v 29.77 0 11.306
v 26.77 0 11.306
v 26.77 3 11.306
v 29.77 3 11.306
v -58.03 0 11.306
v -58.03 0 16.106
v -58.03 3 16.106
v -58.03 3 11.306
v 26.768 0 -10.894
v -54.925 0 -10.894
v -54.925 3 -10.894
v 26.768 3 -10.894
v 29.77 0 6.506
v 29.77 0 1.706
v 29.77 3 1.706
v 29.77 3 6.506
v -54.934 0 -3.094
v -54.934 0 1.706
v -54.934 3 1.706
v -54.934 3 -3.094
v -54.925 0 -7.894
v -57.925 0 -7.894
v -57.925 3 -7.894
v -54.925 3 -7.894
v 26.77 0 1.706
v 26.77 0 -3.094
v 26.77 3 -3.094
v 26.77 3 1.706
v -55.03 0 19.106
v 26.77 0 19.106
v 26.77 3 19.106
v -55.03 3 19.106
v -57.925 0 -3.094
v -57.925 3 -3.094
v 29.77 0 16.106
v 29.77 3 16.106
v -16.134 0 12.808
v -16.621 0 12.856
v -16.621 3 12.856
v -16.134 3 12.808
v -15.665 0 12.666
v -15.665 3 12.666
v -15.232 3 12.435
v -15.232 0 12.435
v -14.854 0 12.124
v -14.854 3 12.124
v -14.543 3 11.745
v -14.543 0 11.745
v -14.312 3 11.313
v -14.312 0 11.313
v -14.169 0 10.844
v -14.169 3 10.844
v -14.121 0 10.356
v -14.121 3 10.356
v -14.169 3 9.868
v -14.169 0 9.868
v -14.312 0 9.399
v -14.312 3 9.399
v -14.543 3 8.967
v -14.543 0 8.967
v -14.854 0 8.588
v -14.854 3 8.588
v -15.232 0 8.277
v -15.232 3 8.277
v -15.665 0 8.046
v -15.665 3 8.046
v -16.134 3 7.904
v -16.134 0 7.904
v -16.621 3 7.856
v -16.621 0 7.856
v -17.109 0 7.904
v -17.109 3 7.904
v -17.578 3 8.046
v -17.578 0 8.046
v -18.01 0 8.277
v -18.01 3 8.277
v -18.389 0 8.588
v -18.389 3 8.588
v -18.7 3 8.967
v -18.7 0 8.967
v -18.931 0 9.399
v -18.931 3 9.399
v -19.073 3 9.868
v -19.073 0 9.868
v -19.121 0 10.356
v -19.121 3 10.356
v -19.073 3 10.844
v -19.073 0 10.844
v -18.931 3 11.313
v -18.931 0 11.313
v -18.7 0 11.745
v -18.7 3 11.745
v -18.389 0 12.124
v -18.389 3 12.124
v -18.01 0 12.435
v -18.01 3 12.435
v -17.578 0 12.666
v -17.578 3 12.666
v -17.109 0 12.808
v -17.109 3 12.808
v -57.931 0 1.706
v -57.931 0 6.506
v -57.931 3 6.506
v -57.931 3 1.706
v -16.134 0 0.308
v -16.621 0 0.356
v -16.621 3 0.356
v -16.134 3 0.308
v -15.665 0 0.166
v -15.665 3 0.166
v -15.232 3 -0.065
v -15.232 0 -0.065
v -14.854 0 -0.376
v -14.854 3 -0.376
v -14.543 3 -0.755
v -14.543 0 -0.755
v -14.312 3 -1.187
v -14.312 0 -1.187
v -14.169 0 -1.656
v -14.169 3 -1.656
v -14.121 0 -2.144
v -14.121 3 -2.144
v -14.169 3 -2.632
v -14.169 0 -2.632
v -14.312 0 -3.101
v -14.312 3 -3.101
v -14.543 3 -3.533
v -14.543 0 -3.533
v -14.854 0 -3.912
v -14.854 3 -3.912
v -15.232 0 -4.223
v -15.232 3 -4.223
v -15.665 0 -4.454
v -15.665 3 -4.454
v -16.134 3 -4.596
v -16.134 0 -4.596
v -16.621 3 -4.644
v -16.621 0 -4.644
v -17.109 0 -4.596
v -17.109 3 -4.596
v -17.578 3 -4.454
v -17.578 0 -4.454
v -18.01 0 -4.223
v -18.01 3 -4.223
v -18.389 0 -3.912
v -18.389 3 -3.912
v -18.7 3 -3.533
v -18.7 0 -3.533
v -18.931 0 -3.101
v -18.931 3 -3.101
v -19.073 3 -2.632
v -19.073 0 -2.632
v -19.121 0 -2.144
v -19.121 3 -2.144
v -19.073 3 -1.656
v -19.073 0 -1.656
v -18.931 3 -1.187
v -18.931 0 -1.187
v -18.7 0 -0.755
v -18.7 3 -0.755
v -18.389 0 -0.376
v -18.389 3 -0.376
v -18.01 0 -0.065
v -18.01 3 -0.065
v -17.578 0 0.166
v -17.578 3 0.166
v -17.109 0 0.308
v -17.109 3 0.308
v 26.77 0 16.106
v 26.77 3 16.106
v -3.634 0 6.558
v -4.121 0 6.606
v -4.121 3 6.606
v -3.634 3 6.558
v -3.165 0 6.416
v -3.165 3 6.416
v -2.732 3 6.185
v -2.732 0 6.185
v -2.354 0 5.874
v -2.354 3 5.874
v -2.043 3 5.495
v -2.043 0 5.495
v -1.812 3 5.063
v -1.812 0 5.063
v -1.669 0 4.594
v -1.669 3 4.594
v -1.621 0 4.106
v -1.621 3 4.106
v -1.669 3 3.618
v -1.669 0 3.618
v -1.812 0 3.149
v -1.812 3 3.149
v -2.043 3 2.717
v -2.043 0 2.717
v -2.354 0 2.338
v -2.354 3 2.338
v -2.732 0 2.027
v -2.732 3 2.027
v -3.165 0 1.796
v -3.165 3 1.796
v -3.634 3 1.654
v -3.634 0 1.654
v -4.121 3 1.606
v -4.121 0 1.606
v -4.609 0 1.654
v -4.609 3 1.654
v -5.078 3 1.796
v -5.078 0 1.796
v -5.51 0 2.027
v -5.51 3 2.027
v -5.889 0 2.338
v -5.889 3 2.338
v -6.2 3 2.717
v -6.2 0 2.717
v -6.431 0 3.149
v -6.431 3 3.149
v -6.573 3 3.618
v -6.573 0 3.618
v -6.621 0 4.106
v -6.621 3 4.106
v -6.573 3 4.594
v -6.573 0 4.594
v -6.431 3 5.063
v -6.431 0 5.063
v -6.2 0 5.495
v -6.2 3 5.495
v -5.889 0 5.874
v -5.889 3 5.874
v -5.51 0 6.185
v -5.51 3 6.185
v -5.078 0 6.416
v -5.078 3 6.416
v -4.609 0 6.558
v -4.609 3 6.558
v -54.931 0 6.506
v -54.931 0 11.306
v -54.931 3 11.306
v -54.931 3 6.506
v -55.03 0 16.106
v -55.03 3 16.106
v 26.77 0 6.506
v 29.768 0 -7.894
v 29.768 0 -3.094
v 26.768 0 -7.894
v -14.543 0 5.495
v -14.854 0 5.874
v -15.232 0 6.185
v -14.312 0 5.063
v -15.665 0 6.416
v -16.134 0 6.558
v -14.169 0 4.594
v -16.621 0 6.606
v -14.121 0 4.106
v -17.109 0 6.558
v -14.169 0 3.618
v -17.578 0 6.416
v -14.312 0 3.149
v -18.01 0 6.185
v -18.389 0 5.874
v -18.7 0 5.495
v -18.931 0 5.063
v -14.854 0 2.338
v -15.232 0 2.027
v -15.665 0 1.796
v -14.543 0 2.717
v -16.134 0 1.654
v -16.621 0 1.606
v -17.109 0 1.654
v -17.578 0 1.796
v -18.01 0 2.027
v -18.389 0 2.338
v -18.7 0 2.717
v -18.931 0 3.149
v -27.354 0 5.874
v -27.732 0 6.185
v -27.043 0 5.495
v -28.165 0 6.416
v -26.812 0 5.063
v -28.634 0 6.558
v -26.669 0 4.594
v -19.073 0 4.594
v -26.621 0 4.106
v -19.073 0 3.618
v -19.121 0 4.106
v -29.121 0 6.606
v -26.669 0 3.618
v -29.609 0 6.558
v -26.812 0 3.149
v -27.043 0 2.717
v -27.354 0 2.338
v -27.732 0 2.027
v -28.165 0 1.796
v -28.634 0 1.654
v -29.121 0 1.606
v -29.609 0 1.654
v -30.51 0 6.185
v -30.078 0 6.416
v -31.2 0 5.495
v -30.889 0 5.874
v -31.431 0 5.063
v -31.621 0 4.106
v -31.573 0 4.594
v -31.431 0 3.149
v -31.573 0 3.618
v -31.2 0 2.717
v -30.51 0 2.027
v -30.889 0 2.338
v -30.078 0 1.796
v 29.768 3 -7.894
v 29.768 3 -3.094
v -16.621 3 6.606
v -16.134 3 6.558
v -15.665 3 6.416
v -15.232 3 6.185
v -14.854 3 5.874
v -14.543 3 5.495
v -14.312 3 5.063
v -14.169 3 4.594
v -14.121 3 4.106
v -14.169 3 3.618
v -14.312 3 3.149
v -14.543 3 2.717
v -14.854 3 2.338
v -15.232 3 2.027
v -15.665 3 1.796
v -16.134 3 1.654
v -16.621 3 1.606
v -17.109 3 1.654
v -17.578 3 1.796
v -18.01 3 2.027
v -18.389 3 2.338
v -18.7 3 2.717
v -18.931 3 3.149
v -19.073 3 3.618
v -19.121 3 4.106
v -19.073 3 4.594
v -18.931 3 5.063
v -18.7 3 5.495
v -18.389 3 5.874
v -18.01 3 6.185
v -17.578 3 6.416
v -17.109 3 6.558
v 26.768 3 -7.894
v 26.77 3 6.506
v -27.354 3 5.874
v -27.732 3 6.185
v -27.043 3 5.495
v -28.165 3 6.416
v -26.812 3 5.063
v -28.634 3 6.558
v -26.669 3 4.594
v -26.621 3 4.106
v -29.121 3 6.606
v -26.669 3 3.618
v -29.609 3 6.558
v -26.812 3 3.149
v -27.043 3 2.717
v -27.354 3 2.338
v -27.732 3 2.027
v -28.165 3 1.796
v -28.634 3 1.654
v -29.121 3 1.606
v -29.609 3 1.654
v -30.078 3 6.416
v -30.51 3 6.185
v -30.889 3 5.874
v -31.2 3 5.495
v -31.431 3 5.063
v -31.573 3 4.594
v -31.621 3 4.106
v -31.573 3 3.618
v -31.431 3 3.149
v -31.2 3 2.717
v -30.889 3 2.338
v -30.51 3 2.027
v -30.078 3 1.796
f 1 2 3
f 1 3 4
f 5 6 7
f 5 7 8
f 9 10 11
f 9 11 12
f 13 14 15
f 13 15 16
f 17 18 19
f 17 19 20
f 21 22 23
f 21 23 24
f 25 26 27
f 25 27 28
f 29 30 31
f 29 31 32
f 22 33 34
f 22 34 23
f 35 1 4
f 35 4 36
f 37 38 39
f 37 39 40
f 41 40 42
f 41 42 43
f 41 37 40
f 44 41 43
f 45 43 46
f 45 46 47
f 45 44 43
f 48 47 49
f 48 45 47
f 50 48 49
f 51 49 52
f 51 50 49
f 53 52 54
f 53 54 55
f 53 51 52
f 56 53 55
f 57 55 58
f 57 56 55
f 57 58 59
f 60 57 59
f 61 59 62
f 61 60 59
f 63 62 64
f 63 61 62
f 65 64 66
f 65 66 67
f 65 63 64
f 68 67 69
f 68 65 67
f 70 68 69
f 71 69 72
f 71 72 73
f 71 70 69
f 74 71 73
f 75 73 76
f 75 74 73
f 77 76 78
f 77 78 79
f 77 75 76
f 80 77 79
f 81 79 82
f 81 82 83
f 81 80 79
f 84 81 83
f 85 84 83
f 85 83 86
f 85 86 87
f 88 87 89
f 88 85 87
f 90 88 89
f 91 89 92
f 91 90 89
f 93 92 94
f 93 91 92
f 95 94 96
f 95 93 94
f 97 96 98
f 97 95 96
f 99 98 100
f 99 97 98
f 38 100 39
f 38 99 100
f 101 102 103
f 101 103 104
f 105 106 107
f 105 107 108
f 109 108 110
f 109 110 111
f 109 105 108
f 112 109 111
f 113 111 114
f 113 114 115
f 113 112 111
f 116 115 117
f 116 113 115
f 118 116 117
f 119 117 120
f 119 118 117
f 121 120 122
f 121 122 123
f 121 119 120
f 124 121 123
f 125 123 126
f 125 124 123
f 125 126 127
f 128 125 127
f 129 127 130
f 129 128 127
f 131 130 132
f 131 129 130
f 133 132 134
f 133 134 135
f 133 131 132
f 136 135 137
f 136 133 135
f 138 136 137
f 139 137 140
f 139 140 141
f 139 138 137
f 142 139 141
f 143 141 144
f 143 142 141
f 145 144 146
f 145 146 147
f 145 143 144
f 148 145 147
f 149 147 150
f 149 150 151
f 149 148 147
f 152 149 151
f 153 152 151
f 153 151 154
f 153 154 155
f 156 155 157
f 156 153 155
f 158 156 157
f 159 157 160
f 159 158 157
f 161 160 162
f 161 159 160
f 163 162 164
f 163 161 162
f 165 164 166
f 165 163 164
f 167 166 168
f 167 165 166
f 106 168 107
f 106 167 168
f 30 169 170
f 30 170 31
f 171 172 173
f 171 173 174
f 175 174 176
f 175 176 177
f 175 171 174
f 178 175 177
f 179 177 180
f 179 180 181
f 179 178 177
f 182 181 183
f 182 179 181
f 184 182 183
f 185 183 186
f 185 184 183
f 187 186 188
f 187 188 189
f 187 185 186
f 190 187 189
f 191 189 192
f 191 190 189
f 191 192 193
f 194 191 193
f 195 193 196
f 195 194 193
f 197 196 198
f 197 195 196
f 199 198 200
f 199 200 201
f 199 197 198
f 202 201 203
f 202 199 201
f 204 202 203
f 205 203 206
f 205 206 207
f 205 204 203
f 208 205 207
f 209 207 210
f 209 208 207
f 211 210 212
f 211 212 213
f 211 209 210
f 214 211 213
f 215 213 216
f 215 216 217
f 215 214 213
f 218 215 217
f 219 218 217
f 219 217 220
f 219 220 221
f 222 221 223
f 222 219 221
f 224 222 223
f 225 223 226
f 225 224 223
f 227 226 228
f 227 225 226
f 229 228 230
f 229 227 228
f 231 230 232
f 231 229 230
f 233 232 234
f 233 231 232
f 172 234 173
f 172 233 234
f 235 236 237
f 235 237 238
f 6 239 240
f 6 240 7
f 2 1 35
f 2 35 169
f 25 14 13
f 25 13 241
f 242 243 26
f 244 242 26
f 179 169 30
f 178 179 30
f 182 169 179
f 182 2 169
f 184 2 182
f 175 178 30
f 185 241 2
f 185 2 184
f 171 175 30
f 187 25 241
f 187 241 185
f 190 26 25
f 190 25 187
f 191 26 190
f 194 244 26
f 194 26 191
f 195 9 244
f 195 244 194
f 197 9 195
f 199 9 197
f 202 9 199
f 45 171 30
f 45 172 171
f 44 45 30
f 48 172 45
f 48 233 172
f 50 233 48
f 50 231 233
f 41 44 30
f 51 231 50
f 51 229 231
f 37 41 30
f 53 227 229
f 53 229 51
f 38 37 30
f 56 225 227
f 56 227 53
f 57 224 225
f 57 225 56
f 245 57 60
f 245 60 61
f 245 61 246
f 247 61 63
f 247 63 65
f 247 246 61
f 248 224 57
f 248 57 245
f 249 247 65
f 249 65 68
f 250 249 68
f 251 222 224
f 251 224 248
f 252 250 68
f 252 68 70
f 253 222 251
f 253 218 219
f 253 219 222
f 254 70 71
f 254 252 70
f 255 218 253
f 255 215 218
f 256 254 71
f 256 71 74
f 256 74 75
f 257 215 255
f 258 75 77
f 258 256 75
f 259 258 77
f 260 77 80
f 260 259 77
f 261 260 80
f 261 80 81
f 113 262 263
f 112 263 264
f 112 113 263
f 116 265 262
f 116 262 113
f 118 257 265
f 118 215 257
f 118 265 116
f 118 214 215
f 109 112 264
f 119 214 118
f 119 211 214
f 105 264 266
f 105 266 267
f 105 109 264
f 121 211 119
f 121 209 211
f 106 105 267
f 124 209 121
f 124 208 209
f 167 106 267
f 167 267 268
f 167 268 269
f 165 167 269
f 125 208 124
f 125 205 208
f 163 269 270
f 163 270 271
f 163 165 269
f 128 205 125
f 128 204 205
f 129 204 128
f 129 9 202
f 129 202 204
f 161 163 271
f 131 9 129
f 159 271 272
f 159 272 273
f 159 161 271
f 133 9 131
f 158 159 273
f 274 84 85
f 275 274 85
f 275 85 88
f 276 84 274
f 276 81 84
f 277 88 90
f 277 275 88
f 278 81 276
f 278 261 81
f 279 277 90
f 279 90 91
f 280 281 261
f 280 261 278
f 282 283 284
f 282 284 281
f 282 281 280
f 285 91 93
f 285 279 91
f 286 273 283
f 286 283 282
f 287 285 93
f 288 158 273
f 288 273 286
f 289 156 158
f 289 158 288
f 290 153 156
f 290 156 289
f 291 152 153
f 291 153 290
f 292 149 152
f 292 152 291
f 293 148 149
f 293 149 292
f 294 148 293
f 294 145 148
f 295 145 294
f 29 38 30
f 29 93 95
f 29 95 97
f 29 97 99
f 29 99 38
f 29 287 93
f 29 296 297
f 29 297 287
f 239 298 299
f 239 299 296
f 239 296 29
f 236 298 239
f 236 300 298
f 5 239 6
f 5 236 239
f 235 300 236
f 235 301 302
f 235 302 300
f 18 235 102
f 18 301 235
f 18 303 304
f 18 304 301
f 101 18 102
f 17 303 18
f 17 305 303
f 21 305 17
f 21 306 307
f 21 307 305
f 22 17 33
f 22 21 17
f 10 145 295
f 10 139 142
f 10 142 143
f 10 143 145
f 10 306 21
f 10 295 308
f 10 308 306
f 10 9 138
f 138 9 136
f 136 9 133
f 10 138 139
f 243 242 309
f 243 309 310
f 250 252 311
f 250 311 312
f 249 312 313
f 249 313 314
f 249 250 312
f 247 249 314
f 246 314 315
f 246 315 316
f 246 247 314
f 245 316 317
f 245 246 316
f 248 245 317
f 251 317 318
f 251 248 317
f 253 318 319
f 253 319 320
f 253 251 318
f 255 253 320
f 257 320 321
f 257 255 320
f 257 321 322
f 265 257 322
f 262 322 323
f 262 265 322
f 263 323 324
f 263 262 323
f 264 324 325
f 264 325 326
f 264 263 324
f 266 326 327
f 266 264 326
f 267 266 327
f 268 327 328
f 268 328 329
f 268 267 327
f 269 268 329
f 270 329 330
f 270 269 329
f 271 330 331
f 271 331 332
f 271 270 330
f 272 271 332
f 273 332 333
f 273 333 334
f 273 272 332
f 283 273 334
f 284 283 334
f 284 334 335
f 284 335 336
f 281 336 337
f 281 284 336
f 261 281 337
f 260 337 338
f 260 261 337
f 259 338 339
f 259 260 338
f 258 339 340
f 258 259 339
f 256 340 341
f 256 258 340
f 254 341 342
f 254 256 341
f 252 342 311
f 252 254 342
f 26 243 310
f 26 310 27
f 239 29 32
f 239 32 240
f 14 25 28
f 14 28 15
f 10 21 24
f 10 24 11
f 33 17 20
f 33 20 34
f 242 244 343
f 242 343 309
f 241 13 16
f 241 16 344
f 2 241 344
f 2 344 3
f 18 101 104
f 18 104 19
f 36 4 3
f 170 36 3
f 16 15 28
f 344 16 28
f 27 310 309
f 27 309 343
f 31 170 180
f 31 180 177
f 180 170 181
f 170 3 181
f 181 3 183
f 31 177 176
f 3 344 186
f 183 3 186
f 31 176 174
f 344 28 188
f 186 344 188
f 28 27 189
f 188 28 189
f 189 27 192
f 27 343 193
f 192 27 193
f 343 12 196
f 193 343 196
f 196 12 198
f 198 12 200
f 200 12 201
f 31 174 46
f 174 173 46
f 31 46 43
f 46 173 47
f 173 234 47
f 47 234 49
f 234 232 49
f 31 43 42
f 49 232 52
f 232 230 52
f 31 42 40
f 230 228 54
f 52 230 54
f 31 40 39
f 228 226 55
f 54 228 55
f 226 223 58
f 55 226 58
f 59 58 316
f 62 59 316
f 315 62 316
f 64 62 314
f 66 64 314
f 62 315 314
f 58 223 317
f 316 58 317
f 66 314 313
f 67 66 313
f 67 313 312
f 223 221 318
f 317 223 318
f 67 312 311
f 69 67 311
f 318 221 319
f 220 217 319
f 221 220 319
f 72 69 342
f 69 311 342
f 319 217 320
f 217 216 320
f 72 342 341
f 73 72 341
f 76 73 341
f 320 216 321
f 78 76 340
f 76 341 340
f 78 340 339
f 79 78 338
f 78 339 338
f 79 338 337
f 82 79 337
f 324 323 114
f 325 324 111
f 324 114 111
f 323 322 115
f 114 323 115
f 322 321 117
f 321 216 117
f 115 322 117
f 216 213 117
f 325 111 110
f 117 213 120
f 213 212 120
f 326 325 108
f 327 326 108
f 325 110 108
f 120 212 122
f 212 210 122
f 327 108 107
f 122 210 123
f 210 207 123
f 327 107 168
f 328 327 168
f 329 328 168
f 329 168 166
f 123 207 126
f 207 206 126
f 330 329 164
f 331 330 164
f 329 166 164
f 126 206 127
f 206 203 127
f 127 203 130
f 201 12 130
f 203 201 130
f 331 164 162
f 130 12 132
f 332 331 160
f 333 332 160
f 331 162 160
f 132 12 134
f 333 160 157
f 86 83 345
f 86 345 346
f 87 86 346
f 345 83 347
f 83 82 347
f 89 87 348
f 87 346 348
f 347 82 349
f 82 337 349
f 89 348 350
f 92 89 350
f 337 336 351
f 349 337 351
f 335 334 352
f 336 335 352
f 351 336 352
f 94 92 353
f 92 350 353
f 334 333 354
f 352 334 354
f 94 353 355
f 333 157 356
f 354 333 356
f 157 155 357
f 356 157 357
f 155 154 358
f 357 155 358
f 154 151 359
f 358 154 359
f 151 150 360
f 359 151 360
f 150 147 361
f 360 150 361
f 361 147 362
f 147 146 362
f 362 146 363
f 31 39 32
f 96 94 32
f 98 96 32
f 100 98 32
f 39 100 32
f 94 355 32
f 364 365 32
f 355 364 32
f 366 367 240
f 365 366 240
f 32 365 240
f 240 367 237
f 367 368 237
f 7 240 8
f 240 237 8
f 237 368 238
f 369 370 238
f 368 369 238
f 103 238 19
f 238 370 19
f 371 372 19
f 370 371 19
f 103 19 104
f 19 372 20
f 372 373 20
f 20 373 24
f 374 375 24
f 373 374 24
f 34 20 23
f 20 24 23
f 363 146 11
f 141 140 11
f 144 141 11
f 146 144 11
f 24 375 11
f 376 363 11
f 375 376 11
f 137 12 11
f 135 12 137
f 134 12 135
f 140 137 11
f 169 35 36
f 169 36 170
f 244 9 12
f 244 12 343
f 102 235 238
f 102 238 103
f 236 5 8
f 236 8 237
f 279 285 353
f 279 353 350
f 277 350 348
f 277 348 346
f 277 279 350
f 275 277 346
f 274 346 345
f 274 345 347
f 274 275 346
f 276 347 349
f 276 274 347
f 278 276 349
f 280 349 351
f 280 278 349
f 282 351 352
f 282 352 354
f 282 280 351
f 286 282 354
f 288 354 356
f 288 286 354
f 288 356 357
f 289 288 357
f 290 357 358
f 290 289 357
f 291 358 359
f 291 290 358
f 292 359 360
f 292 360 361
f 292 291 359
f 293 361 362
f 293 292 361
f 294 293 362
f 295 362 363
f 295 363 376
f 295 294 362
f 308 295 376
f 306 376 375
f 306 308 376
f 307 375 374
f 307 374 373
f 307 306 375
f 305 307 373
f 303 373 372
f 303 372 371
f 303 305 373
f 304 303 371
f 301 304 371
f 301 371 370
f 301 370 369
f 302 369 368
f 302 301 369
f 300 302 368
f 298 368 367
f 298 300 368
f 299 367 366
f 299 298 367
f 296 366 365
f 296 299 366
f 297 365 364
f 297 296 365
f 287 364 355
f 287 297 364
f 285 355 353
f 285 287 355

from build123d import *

# Parameters (mm, degrees)
ESBO_O1_R                = 2.5
ESBO_O1_R_2              = 2.499999997
ESBO_O1_R_3              = 2.500000003
RESSALTO_EXTRUS_O1_DEPTH = 3


with BuildPart() as part:
    # Esboço1 → Ressalto-extrusão1 (new body)
    with BuildSketch(Plane(origin=(0, 0, 0), x_dir=(1, 0, 0), z_dir=(0, 1, 0))):
        Polygon((-57.924923454, 7.893845864), (-54.924923454, 7.893845864), (-54.924923454, 10.893845864), (26.768392501, 10.893845864), (26.768392501, 7.893845864), (29.768392501, 7.893845864), (29.768392501, 3.093845864), (26.770408679, 3.093845864), (26.770408679, -1.706154136), (29.770408679, -1.706154136), (29.770408679, -6.506154136), (26.770408679, -6.506154136), (26.770408679, -11.306154136), (29.770408679, -11.306154136), (29.770408679, -16.105925898), (26.770408679, -16.105925898), (26.770408679, -19.105925898), (-55.029591321, -19.105925898), (-55.029591321, -16.105925898), (-58.029591321, -16.105925898), (-58.029591321, -11.306154136), (-54.931224008, -11.306154136), (-54.931224008, -6.506154136), (-57.931224008, -6.506154136), (-57.931224008, -1.706154136), (-54.934182698, -1.706154136), (-54.934182698, 3.093845864), (-57.924923454, 3.093845864), align=None)
        with Locations(Location((-16.621271344, -4.105925898, 0), (0, 0, 270))):
            Circle(ESBO_O1_R, mode=Mode.SUBTRACT)
        with Locations(Location((-16.621271344, 2.144074102, 0), (0, 0, 270))):
            Circle(ESBO_O1_R, mode=Mode.SUBTRACT)
        with Locations(Location((-4.121271344, -4.105925898, 0), (0, 0, 270))):
            Circle(ESBO_O1_R_2, mode=Mode.SUBTRACT)
        with Locations(Location((-16.621271344, -10.355925898, 0), (0, 0, 270))):
            Circle(ESBO_O1_R, mode=Mode.SUBTRACT)
        with Locations(Location((-29.121271344, -4.105925898, 0), (0, 0, 270))):
            Circle(ESBO_O1_R_3, mode=Mode.SUBTRACT)
    extrude(amount=RESSALTO_EXTRUS_O1_DEPTH)


solid = part.part
